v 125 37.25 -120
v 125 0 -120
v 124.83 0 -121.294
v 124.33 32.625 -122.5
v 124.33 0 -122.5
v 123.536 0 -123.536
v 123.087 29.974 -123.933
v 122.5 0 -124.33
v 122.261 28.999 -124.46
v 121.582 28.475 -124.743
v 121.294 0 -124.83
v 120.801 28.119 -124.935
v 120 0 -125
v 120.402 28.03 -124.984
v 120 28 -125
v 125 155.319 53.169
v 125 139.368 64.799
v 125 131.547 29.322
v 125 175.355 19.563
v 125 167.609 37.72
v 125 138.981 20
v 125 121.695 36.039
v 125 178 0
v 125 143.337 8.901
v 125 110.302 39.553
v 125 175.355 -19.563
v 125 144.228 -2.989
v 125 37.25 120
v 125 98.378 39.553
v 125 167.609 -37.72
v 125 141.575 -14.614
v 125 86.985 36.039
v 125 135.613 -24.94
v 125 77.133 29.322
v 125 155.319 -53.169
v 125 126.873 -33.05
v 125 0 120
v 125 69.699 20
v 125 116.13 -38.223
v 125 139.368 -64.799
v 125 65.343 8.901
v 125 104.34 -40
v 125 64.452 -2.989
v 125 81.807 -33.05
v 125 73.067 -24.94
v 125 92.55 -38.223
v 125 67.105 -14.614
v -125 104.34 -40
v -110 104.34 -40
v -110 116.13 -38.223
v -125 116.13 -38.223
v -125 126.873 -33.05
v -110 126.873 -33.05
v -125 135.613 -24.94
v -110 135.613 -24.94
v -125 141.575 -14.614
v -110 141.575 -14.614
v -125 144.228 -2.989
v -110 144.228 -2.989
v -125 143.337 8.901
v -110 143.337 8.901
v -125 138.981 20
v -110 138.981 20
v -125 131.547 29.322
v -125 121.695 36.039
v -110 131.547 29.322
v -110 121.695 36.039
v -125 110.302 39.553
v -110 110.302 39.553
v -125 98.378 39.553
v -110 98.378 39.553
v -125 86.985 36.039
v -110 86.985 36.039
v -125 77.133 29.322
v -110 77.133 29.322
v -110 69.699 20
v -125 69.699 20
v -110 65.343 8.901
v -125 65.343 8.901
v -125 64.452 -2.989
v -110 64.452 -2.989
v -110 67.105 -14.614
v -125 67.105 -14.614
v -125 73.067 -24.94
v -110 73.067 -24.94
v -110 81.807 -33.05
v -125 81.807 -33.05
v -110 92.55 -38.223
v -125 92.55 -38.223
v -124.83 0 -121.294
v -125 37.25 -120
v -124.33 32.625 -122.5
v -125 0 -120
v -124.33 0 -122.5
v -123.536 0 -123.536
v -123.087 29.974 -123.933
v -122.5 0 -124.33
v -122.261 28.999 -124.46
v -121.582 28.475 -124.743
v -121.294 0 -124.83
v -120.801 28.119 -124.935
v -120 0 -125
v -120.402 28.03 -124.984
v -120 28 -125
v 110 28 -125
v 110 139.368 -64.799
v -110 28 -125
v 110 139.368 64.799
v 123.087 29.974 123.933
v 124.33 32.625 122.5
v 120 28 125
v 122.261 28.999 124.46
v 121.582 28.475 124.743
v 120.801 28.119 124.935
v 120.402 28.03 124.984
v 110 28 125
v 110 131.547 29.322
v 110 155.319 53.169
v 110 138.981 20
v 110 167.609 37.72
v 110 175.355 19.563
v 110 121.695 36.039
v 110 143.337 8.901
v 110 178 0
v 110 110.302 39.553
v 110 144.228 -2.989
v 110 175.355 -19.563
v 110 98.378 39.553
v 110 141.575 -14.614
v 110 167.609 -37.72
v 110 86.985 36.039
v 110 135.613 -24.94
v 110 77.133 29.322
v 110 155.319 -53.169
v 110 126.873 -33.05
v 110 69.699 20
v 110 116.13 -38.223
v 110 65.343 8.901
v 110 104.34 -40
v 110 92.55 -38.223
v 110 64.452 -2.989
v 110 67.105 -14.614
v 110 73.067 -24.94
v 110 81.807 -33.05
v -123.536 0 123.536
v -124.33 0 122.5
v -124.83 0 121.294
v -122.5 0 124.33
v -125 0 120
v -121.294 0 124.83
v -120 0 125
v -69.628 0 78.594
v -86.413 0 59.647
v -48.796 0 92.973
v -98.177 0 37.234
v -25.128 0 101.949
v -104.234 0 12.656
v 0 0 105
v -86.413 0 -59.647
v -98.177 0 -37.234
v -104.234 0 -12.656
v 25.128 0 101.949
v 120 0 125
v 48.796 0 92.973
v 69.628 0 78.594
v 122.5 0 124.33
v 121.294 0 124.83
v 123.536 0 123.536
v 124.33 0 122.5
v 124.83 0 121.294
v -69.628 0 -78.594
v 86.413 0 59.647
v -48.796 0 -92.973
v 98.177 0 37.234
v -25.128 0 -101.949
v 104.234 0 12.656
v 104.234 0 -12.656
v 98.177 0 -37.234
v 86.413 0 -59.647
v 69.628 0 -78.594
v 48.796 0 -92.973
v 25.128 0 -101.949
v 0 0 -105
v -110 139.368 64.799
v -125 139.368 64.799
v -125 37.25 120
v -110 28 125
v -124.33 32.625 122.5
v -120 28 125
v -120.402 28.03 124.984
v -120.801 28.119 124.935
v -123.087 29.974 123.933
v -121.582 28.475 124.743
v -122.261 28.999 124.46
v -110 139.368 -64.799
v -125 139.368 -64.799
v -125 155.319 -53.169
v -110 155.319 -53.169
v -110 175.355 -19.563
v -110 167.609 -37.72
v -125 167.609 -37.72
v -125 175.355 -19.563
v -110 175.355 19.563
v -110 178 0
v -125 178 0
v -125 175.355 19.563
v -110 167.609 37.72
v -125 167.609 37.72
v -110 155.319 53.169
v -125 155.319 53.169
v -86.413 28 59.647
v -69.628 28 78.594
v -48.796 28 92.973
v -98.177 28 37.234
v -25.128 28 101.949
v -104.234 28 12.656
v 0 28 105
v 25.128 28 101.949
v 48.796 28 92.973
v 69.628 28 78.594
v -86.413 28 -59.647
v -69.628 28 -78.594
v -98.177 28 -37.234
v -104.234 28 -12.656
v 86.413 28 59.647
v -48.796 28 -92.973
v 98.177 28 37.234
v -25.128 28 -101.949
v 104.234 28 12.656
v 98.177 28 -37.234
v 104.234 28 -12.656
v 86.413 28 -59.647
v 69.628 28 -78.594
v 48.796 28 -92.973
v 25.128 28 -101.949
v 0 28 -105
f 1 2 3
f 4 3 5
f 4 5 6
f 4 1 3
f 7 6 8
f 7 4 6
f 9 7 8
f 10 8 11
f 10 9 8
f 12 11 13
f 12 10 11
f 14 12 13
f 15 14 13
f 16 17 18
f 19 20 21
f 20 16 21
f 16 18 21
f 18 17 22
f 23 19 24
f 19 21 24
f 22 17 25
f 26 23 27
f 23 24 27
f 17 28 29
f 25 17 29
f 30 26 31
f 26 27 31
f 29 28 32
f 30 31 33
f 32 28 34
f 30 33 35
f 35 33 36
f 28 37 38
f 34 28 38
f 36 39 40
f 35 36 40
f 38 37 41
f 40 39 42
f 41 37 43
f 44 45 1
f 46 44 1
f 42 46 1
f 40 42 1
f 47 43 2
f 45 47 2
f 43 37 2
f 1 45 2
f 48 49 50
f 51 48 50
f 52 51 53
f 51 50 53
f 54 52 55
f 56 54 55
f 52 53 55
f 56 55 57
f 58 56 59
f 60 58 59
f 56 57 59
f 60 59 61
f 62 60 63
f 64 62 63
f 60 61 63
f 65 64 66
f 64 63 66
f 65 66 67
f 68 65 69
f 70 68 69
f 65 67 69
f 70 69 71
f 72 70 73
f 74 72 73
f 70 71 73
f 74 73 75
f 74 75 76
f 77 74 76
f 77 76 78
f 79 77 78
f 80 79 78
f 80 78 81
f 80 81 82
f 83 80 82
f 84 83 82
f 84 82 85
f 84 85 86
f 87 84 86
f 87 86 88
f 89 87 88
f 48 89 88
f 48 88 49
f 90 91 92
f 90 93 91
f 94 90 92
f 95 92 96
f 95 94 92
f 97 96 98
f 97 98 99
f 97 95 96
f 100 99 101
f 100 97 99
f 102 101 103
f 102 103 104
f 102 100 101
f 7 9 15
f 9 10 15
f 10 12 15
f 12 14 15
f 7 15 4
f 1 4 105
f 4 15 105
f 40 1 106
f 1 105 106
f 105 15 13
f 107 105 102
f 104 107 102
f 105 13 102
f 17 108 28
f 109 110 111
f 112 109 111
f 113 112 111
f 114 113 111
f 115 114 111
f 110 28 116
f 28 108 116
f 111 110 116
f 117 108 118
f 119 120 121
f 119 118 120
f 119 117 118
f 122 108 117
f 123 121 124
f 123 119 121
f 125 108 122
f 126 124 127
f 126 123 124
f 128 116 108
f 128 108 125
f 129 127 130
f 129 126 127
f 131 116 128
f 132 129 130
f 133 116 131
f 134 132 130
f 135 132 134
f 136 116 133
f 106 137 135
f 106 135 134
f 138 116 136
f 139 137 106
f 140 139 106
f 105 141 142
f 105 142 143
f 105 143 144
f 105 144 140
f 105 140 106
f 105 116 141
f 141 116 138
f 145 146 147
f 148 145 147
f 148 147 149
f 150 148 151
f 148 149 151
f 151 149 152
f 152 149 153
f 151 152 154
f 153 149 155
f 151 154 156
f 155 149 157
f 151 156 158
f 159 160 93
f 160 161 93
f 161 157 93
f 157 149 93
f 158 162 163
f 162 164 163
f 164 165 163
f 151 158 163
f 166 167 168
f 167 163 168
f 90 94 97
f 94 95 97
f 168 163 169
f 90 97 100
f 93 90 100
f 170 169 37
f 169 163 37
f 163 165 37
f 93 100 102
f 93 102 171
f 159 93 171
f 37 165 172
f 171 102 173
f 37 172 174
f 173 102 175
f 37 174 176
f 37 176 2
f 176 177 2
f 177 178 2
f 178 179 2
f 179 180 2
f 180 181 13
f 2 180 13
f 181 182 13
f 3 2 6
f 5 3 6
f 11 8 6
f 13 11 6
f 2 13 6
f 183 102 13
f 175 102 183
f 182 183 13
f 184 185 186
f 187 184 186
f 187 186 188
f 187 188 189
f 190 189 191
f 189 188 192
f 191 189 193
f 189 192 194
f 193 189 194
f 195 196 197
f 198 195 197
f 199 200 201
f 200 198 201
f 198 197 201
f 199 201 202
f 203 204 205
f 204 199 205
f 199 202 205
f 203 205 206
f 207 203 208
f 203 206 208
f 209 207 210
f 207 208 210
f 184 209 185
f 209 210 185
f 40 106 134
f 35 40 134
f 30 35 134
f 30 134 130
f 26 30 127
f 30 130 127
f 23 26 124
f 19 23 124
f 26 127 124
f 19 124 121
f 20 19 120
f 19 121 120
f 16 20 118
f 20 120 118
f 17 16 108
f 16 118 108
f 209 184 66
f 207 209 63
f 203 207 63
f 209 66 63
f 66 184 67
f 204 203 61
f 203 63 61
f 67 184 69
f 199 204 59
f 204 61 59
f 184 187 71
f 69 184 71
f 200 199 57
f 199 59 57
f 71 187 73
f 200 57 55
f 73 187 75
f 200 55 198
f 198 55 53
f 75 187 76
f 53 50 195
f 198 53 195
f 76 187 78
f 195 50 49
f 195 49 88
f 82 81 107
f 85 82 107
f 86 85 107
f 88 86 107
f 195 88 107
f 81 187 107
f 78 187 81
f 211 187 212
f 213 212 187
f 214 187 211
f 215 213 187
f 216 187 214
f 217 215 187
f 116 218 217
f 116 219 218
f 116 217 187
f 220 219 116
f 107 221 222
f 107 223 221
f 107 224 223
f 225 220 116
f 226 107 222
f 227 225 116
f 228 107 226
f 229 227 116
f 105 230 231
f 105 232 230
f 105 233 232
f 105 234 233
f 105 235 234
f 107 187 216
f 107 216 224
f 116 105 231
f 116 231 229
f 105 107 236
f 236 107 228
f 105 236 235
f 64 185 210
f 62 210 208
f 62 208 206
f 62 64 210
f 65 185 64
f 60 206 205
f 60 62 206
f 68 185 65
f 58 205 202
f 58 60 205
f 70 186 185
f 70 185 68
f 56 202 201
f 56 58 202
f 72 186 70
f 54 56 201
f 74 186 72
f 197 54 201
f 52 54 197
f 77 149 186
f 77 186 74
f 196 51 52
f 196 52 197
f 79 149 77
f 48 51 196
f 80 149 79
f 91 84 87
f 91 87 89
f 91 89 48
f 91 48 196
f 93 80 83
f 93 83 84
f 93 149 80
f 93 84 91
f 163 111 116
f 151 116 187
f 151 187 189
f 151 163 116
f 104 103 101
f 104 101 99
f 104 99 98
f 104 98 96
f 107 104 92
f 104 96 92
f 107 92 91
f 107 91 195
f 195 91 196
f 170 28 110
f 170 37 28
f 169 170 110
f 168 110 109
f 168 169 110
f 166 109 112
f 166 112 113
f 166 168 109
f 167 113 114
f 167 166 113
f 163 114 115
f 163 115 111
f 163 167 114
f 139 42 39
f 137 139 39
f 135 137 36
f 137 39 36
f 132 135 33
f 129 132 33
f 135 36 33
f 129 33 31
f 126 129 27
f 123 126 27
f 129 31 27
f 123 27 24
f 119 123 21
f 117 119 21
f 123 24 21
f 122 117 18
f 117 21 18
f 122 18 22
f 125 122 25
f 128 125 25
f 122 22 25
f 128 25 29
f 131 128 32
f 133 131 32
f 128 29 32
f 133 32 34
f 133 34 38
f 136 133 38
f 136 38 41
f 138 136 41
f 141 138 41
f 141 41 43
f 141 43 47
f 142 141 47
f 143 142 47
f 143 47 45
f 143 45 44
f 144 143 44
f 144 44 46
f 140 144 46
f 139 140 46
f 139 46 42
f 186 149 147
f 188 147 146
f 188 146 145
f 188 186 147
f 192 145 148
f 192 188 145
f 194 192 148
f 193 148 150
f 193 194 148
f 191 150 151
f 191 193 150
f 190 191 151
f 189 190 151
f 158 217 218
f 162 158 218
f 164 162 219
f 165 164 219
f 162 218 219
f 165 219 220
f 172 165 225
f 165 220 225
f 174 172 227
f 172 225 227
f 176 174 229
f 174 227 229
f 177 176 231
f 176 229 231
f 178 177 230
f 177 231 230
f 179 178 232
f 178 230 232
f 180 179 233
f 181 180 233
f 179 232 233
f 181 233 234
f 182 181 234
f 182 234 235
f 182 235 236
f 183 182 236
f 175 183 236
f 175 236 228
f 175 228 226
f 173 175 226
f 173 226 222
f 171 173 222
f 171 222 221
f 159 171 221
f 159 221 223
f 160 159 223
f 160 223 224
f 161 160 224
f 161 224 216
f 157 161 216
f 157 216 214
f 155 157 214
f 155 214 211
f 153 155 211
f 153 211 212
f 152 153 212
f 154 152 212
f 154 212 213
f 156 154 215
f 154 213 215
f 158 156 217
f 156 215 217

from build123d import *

# Parameters (mm, degrees)
SKETCH1_W               = 250
SKETCH1_H               = 250
BOSS_EXTRUDE1_DEPTH     = 28
CUT_EXTRUDE1_REACH      = 180.98
SKETCH2_R               = 105
SKETCH3_W               = 15
SKETCH3_H               = 250
BOSS_EXTRUDE2_DEPTH     = 150
SKETCH4_R               = 40
CUT_EXTRUDE2_DEPTH      = 332.374410599
CUT_EXTRUDE4_DEPTH      = 332.374410599
CUT_EXTRUDE4_DEPTH_BACK = 332.374410599
FILLET1_R               = 5


with BuildPart() as part:
    # Sketch1 → Boss-Extrude1 (new body)
    with BuildSketch(Plane(origin=(0, 0, 0), x_dir=(1, 0, 0), z_dir=(0, 1, 0))):
        Rectangle(SKETCH1_W, SKETCH1_H)
    extrude(amount=BOSS_EXTRUDE1_DEPTH)

    # Sketch2 → Cut-Extrude1 (cut, up to next)
    with BuildSketch(Plane(origin=(0, 28, 0), x_dir=(1, 0, 0), z_dir=(0, 1, 0)), mode=Mode.PRIVATE) as cut_extrude1_sk1:
        with Locations(Location((0, 0, 0), (0, 0, 270))):
            Circle(SKETCH2_R)
    cut_extrude1_tool1 = extrude(cut_extrude1_sk1.sketch, amount=-CUT_EXTRUDE1_REACH, mode=Mode.PRIVATE) & part.part
    add(cut_extrude1_tool1.solids().sort_by_distance((0, 28, 0))[0], mode=Mode.SUBTRACT)

    # Sketch3 → Boss-Extrude2 (add)
    with BuildSketch(Plane(origin=(0, 28, 0), x_dir=(1, 0, 0), z_dir=(0, 1, 0))):
        with Locations((-117.5, 0)):
            Rectangle(SKETCH3_W, SKETCH3_H)
    boss_extrude2 = extrude(amount=BOSS_EXTRUDE2_DEPTH)

    # Mirror1: Boss-Extrude2 across plane
    add(boss_extrude2.mirror(Plane(origin=(0, 0, 0), x_dir=(0, 0, 1), z_dir=(1, 0, 0))))

    # Sketch4 → Cut-Extrude2 (cut, through all)
    with BuildSketch(Plane(origin=(125, 0, 0), x_dir=(0, 0, -1), z_dir=(1, 0, 0))):
        with Locations((0, 104.34)):
            Circle(SKETCH4_R)
    extrude(amount=-CUT_EXTRUDE2_DEPTH, mode=Mode.SUBTRACT)

    # Sketch5 → Cut-Extrude4 (cut, two sides: drawn at the far end of the back side and taken through both)
    with BuildSketch(Plane(origin=(125, 0, 0), x_dir=(0, 0, -1), z_dir=(1, 0, 0)).offset(-CUT_EXTRUDE4_DEPTH_BACK)):
        with BuildLine():
            Line((407.036525122, -493.744479882), (125, 28))
            Line((125, 28), (64.798533304, 139.367784424))
            ThreePointArc((64.798533304, 139.367784424), (0, 178), (-64.798533304, 139.367784424))
            Line((-64.798533304, 139.367784424), (-125, 28))
            Line((-125, 28), (-407.036525122, -493.744479882))
            Line((-407.036525122, -493.744479882), (-407.036525122, 692.445899087))
            Line((-407.036525122, 692.445899087), (407.036525122, 692.445899087))
            Line((407.036525122, 692.445899087), (407.036525122, -493.744479882))
        make_face()
    extrude(amount=CUT_EXTRUDE4_DEPTH + CUT_EXTRUDE4_DEPTH_BACK, mode=Mode.SUBTRACT)

    # Fillet1
    fillet1_edges = [part.edges().sort_by_distance(p)[0] for p in [
        (125, 14, 125),
        (-125, 14, 125),
        (-125, 14, -125),
        (125, 14, -125),
    ]]
    fillet(fillet1_edges, radius=FILLET1_R)


solid = part.part
